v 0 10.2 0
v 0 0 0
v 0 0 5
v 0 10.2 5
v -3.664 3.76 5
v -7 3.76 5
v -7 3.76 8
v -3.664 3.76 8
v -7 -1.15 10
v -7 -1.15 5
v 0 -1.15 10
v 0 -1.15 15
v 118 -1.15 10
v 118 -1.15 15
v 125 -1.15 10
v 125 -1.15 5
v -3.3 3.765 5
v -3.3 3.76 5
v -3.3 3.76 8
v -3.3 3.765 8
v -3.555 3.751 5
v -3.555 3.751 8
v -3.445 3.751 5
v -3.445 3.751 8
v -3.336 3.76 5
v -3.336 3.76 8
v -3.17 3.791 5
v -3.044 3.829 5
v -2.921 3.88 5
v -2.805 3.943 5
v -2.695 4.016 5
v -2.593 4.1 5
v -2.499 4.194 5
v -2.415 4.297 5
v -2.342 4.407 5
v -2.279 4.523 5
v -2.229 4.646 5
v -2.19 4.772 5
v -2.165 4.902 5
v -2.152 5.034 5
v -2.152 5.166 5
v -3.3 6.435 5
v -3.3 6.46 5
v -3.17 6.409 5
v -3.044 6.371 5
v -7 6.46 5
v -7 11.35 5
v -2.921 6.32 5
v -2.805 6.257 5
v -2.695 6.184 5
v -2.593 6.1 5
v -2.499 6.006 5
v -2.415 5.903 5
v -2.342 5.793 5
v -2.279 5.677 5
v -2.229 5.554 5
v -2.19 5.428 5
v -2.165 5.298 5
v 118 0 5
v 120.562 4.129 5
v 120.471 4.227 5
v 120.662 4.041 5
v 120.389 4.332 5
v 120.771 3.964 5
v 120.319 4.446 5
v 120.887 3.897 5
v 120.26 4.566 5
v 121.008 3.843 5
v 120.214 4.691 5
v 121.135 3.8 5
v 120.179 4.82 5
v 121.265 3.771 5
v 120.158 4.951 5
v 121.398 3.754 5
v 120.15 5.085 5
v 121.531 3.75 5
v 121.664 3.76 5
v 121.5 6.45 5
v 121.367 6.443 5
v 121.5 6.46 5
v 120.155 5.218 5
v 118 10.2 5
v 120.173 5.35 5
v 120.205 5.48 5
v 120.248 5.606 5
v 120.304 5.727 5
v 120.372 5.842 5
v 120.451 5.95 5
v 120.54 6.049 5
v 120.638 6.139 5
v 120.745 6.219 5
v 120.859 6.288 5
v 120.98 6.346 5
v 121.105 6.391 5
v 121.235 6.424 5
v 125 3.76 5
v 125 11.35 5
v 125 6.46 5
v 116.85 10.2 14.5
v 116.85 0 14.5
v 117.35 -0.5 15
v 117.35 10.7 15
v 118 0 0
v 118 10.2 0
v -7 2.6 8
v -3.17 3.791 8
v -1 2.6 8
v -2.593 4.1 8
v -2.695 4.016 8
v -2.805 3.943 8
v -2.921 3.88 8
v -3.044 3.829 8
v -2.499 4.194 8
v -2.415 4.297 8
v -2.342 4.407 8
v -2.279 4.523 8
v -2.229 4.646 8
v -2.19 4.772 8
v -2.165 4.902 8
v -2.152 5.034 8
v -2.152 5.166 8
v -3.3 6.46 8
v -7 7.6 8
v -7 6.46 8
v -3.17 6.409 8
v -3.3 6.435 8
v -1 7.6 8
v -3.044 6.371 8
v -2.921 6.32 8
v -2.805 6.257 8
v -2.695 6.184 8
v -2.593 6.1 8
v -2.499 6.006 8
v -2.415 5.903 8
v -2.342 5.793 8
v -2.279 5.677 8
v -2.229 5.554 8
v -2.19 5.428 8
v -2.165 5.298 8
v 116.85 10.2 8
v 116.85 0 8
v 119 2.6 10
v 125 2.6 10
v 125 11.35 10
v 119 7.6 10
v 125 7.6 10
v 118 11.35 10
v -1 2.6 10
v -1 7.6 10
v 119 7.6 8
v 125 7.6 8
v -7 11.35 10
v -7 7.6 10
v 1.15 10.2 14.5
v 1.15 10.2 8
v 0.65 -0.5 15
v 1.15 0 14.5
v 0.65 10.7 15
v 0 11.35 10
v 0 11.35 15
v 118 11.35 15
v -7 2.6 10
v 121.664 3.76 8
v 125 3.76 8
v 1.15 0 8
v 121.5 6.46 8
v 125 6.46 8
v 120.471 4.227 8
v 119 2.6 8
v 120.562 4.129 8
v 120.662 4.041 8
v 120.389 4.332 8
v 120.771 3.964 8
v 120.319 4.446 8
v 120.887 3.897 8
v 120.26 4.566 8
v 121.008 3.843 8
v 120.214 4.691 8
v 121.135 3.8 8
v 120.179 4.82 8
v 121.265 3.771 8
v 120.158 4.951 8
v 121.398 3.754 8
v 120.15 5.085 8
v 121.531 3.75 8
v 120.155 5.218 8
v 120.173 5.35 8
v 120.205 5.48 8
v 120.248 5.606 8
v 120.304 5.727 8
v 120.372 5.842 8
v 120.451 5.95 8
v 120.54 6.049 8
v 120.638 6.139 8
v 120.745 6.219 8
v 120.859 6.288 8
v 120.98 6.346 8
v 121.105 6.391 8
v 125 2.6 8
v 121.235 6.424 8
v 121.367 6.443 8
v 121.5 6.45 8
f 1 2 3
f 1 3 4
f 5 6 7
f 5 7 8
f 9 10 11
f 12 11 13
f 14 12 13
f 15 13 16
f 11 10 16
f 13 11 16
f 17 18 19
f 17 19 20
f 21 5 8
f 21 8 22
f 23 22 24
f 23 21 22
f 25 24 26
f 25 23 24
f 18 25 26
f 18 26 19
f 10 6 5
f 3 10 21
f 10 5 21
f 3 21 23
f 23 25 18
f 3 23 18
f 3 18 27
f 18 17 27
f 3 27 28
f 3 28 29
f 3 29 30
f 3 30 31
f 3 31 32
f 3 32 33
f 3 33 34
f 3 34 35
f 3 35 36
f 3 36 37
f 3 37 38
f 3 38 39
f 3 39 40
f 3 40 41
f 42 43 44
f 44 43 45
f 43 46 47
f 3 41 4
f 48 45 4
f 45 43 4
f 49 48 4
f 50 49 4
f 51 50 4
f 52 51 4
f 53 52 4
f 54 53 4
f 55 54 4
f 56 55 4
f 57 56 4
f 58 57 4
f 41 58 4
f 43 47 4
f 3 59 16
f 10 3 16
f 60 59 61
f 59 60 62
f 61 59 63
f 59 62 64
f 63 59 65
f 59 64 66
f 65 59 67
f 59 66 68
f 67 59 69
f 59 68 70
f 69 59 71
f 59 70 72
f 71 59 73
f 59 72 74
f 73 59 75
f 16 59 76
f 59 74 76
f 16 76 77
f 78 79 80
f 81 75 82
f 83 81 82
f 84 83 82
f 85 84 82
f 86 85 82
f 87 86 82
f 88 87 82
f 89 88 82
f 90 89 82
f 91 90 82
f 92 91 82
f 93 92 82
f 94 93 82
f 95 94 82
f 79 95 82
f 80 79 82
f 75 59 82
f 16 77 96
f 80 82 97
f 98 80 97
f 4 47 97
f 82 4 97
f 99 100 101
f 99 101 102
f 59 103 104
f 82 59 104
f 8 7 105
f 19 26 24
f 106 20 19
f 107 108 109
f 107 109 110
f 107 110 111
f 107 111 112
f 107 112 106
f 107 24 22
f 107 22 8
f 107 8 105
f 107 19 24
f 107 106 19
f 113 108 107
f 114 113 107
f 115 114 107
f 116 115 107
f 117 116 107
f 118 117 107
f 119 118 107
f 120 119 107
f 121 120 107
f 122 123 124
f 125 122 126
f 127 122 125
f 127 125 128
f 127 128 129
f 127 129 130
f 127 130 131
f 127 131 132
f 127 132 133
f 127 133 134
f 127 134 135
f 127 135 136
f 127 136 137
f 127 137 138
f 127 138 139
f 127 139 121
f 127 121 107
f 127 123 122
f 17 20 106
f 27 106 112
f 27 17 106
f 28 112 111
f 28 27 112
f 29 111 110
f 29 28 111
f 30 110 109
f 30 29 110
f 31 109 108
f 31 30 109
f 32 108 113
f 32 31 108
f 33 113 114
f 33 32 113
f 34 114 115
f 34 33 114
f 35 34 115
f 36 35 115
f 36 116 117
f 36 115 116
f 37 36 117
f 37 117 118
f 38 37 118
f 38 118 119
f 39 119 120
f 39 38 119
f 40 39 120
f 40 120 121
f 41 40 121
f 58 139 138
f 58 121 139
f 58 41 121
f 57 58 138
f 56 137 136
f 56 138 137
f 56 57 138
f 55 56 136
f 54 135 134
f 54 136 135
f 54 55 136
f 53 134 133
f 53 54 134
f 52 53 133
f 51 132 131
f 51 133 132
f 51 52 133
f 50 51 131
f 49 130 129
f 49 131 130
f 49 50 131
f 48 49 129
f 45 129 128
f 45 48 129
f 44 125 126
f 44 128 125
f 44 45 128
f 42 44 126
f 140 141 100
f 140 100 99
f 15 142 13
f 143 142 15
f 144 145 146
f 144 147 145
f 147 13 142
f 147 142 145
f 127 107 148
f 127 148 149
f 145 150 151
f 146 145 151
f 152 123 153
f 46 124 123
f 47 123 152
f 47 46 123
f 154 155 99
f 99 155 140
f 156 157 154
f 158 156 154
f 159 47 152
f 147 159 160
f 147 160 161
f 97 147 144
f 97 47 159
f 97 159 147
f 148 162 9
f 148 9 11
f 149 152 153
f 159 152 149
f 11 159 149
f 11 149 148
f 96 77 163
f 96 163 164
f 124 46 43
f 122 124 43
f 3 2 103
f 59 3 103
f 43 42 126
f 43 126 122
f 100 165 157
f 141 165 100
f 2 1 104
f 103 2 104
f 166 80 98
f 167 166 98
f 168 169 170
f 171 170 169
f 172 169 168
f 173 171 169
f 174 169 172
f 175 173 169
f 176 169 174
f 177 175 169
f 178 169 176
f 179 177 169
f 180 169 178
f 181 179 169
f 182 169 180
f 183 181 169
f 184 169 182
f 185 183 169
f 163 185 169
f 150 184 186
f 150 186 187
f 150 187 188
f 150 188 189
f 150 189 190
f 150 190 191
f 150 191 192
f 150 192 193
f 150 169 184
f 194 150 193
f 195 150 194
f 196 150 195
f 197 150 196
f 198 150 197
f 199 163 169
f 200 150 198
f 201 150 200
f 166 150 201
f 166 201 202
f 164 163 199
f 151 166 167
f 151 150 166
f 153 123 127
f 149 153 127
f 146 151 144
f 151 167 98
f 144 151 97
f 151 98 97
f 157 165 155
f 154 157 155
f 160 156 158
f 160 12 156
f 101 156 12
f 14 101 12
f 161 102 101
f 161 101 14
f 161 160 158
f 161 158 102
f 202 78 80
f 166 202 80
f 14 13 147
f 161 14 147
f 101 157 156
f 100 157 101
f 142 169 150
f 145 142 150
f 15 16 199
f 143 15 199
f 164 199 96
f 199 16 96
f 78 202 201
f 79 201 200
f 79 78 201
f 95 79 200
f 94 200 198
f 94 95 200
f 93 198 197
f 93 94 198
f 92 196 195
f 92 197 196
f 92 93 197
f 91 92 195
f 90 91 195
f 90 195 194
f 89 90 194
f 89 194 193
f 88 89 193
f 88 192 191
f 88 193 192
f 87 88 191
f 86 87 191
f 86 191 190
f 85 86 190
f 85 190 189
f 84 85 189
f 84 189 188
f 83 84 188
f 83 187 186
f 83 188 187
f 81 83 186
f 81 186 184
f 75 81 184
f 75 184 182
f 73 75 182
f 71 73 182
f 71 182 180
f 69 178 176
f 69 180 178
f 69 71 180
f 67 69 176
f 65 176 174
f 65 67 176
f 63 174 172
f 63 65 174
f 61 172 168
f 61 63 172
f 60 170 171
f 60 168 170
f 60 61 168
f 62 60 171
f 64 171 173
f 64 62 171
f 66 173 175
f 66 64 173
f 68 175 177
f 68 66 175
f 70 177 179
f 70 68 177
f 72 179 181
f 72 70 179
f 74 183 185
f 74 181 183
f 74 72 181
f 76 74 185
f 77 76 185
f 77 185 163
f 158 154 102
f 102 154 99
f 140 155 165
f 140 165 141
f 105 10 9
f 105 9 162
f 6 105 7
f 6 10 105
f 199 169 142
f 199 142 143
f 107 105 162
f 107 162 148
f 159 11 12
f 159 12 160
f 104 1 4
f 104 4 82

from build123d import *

# Parameters (mm, degrees)
BOX004_W          = 10
BOX004_H          = 14
BOX004_DEPTH      = 10
BOX006_W          = 10
BOX006_H          = 2.7
BOX006_DEPTH      = 10
BOX003_W          = 10
BOX003_H          = 14
BOX003_DEPTH      = 10
CYLINDER_R        = 1.35
CYLINDER_DEPTH    = 10
BOX005_W          = 10
BOX005_H          = 2.7
BOX005_DEPTH      = 10
CYLINDER001_R     = 1.35
CYLINDER001_DEPTH = 10
BOX007_W          = 10
BOX007_H          = 5
BOX007_DEPTH      = 10
BOX008_W          = 10
BOX008_H          = 5
BOX008_DEPTH      = 10
BOX002_W          = 115.7
BOX002_H          = 10.2
BOX002_DEPTH      = 7
BOX_W             = 132
BOX_H             = 12.5
BOX_DEPTH         = 10
BOX001_W          = 118
BOX001_H          = 10.2
BOX001_DEPTH      = 5
CHAMFER_SIZE      = 0.5


with BuildPart() as box004:
    # Box004 → Box004 (new body)
    with BuildSketch(Plane(origin=(118, -2, 10), x_dir=(1, 0, 0), z_dir=(0, 0, 1))):
        with Locations((5, 7)):
            Rectangle(BOX004_W, BOX004_H)
    extrude(amount=BOX004_DEPTH)


with BuildPart() as box006:
    # Box006 → Box006 (new body)
    with BuildSketch(Plane(origin=(121.5, 3.76, 0), x_dir=(1, 0, 0), z_dir=(0, 0, 1))):
        with Locations((5, 1.35)):
            Rectangle(BOX006_W, BOX006_H)
    extrude(amount=BOX006_DEPTH)


with BuildPart() as box003:
    # Box003 → Box003 (new body)
    with BuildSketch(Plane(origin=(-10, -2, 10), x_dir=(1, 0, 0), z_dir=(0, 0, 1))):
        with Locations((5, 7)):
            Rectangle(BOX003_W, BOX003_H)
    extrude(amount=BOX003_DEPTH)


with BuildPart() as cylinder:
    # Cylinder → Cylinder (new body)
    with BuildSketch(Plane(origin=(-3.5, 5.1, 0), x_dir=(1, 0, 0), z_dir=(0, 0, 1))):
        Circle(CYLINDER_R)
    extrude(amount=CYLINDER_DEPTH)


with BuildPart() as box005:
    # Box005 → Box005 (new body)
    with BuildSketch(Plane(origin=(-13.3, 3.76, 0), x_dir=(1, 0, 0), z_dir=(0, 0, 1))):
        with Locations((5, 1.35)):
            Rectangle(BOX005_W, BOX005_H)
    extrude(amount=BOX005_DEPTH)


with BuildPart() as cylinder001:
    # Cylinder001 → Cylinder001 (new body)
    with BuildSketch(Plane(origin=(121.5, 5.1, 0), x_dir=(1, 0, 0), z_dir=(0, 0, 1))):
        Circle(CYLINDER001_R)
    extrude(amount=CYLINDER001_DEPTH)


with BuildPart() as box007:
    # Box007 → Box007 (new body)
    with BuildSketch(Plane(origin=(-11, 2.6, 8), x_dir=(1, 0, 0), z_dir=(0, 0, 1))):
        with Locations((5, 2.5)):
            Rectangle(BOX007_W, BOX007_H)
    extrude(amount=BOX007_DEPTH)


with BuildPart() as box008:
    # Box008 → Box008 (new body)
    with BuildSketch(Plane(origin=(119, 2.6, 8), x_dir=(1, 0, 0), z_dir=(0, 0, 1))):
        with Locations((5, 2.5)):
            Rectangle(BOX008_W, BOX008_H)
    extrude(amount=BOX008_DEPTH)


with BuildPart() as fusion:
    # Box002 → Box002 (new body)
    with BuildSketch(Plane(origin=(1.15, 0, 8), x_dir=(1, 0, 0), z_dir=(0, 0, 1))):
        with Locations((57.85, 5.1)):
            Rectangle(BOX002_W, BOX002_H)
    extrude(amount=BOX002_DEPTH)

    # Fusion: union Box004, Box006, Box003, Cylinder, Box005, Cylinder001, Box007, Box008
    add(box004.part)
    add(box006.part)
    add(box003.part)
    add(cylinder.part)
    add(box005.part)
    add(cylinder001.part)
    add(box007.part)
    add(box008.part)


with BuildPart() as box:
    # Box → Box (new body)
    with BuildSketch(Plane(origin=(-7, -1.15, 5), x_dir=(1, 0, 0), z_dir=(0, 0, 1))):
        with Locations((66, 6.25)):
            Rectangle(BOX_W, BOX_H)
    extrude(amount=BOX_DEPTH)


with BuildPart() as chamfer_body:
    # Box001 → Box001 (new body)
    with BuildSketch(Plane.XY):
        with Locations((59, 5.1)):
            Rectangle(BOX001_W, BOX001_H)
    extrude(amount=BOX001_DEPTH)

    # Fusion001: union Box
    add(box.part)

    # Cut: cut Fusion
    add(fusion.part, mode=Mode.SUBTRACT)

    # Chamfer
    chamfer_edges = [chamfer_body.edges().sort_by_distance(p)[0] for p in [
        (1.15, 5.1, 15),
        (59, 0, 15),
        (116.85, 5.1, 15),
        (59, 10.2, 15),
    ]]
    chamfer(chamfer_edges, length=CHAMFER_SIZE)


solid = chamfer_body.part
